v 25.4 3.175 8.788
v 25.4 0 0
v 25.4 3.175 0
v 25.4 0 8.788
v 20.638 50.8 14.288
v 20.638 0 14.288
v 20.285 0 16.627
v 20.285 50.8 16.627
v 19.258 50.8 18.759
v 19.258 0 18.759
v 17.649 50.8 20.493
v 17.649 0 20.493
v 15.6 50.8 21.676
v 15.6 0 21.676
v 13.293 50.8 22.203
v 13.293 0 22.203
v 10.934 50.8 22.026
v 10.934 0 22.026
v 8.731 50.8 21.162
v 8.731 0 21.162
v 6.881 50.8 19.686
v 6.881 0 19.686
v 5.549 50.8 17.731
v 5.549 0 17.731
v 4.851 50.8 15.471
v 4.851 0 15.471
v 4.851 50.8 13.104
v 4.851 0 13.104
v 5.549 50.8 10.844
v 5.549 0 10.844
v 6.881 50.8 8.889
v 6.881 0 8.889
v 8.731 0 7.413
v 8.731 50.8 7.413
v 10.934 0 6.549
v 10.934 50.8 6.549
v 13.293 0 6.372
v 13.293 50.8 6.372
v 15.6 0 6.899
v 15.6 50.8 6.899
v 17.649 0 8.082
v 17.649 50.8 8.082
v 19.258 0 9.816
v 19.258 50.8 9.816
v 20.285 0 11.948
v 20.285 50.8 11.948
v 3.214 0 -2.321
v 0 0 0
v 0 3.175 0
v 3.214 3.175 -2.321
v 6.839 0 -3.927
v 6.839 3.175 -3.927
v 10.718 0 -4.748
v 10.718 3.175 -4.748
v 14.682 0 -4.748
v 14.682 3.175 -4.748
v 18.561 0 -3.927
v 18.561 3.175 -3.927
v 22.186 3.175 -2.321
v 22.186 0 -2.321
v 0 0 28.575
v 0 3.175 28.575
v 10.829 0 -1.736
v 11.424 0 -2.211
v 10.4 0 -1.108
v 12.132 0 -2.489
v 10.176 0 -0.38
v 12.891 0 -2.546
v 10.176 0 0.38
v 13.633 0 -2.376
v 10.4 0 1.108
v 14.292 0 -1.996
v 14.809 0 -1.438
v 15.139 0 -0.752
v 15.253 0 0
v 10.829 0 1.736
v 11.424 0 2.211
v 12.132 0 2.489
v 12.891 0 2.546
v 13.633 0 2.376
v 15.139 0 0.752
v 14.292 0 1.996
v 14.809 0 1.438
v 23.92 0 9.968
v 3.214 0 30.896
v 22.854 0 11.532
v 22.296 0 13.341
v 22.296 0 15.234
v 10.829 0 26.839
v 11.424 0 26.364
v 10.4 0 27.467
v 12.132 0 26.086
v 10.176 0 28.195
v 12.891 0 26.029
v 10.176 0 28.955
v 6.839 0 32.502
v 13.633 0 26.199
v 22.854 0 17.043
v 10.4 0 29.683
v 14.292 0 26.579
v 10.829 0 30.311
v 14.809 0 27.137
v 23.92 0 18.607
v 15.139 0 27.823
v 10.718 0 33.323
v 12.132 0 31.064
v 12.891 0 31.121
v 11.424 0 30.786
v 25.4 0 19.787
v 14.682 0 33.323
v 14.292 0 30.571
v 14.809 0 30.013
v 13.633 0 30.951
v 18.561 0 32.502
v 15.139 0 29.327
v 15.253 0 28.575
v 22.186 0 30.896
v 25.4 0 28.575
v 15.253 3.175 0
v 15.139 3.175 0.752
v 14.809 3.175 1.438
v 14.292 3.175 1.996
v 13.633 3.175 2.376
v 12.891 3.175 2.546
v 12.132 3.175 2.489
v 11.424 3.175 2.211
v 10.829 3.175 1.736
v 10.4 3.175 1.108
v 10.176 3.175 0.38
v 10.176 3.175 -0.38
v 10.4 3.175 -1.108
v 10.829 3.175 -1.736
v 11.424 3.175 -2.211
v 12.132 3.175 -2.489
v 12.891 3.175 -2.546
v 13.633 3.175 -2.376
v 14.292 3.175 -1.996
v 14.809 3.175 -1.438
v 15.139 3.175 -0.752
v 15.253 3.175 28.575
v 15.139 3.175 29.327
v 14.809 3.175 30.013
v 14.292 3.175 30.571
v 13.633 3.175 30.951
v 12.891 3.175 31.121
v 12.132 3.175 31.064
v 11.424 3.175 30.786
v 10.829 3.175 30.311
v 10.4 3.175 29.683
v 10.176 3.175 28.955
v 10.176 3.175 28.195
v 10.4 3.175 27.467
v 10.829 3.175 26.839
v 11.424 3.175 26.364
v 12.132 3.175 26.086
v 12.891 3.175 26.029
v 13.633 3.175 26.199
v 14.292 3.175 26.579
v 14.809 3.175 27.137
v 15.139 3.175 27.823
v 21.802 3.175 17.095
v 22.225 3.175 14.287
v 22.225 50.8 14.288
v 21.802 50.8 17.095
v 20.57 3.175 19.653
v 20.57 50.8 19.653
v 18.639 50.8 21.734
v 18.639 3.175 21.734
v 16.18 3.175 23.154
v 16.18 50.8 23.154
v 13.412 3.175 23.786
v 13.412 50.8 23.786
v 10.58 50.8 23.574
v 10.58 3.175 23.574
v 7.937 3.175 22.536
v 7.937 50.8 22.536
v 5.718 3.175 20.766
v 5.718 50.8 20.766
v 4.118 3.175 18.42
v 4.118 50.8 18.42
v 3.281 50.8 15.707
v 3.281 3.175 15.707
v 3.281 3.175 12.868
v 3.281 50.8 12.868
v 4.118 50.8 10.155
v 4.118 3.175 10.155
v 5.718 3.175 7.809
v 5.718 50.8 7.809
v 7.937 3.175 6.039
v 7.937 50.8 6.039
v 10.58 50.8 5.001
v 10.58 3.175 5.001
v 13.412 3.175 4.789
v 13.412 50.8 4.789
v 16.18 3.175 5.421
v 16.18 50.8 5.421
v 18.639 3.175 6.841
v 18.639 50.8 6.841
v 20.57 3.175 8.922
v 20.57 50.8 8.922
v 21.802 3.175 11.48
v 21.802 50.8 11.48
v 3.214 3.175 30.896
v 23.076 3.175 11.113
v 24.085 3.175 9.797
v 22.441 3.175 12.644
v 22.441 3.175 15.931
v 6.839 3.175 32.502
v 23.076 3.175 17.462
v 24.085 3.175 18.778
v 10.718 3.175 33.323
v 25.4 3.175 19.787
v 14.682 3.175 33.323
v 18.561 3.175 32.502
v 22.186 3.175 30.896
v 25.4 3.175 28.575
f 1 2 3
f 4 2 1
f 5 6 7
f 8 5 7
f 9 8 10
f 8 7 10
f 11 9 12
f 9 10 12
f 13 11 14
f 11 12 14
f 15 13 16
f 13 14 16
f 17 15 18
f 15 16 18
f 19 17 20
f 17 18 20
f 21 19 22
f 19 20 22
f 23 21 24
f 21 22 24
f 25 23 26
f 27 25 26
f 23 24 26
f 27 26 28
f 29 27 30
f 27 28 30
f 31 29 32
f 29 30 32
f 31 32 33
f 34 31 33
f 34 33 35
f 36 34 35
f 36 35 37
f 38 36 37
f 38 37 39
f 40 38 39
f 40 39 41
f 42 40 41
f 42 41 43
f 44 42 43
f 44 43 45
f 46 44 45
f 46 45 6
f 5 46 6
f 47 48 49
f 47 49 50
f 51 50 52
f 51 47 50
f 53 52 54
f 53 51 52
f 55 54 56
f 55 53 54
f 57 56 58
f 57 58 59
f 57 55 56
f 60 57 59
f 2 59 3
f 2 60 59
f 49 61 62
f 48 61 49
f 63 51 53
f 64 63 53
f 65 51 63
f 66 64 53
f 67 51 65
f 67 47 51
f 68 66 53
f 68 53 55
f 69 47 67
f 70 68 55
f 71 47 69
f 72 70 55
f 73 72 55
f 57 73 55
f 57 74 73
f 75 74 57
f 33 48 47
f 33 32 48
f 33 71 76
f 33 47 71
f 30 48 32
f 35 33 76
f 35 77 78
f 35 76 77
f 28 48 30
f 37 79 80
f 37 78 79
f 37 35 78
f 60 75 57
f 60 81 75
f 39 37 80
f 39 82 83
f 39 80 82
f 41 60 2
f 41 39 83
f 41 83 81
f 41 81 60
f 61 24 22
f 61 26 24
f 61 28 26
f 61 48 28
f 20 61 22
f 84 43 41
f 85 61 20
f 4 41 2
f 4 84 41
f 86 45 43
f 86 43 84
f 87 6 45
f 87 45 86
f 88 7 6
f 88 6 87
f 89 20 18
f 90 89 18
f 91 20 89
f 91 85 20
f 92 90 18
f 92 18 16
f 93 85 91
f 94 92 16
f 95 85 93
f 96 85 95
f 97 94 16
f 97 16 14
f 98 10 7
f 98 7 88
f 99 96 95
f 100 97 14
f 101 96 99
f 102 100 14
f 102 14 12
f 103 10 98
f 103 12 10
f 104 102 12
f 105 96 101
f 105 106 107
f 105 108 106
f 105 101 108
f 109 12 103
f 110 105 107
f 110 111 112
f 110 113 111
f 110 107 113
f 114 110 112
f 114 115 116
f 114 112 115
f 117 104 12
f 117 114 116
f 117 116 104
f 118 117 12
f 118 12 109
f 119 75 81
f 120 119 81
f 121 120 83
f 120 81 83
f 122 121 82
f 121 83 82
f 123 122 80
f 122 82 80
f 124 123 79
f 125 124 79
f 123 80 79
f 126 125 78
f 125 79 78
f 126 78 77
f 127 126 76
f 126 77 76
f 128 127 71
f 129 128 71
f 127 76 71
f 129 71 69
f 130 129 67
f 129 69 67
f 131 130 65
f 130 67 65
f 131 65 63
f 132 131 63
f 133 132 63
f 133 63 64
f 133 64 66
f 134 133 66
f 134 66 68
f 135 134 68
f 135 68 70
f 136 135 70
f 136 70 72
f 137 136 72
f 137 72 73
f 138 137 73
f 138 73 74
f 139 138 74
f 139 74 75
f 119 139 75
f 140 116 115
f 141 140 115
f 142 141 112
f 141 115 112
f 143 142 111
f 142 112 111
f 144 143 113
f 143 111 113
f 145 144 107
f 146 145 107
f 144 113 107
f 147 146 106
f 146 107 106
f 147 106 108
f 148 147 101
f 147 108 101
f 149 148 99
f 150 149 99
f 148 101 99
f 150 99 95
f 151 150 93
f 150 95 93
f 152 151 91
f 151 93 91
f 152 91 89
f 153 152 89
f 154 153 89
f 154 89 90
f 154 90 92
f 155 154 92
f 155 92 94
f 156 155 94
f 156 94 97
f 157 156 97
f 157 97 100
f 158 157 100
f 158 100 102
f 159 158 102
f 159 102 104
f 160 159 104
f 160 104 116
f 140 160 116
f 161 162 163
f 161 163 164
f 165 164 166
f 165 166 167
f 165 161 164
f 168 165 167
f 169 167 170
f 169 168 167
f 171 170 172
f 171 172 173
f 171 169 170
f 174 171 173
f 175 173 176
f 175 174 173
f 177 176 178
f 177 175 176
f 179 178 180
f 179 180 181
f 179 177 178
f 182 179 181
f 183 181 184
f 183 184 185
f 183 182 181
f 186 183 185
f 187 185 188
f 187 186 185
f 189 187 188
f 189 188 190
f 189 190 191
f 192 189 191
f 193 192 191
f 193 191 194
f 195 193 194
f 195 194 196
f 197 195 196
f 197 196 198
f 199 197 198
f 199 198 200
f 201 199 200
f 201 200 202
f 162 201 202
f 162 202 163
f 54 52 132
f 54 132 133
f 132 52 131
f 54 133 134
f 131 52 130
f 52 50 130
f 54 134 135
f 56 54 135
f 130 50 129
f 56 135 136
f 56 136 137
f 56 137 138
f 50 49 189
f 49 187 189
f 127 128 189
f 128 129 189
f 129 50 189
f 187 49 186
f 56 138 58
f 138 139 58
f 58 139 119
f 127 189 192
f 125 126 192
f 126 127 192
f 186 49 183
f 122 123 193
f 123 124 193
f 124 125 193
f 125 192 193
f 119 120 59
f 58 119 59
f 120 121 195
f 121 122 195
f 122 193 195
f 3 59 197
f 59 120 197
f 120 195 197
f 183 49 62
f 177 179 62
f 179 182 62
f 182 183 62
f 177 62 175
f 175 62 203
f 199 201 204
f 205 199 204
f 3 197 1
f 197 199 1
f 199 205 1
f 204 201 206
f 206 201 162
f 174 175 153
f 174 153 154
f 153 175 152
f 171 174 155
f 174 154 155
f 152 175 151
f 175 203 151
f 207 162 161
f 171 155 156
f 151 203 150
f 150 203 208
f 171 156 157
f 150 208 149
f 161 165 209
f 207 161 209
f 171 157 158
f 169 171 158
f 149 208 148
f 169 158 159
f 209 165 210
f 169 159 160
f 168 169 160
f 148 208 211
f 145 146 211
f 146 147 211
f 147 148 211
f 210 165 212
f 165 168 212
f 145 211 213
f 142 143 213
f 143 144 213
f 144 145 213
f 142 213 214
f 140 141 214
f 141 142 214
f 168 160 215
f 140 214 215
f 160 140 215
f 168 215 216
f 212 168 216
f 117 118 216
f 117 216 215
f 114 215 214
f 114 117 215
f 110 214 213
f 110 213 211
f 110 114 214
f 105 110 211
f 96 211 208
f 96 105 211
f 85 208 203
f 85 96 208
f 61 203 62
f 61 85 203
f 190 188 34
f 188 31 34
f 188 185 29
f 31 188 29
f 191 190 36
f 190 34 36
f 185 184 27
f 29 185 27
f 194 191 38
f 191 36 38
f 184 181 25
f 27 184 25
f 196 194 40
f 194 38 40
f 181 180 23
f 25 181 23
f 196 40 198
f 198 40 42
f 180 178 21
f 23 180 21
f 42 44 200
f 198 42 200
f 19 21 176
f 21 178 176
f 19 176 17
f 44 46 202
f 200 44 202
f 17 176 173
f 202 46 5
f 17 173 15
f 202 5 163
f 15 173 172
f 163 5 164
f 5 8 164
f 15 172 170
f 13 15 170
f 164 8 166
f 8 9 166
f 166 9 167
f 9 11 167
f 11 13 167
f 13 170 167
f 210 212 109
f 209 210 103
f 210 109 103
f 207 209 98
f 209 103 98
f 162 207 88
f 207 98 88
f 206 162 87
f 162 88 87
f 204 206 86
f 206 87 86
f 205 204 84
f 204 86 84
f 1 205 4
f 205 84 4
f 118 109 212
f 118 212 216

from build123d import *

# Parameters (mm, degrees)
F1_DEPTH = 3.175
F2_R     = 2.5527
F2_R_2   = 7.9375
F3_DEPTH = 3.176
F4_R     = 9.525
F4_R_2   = 7.9375
F5_DEPTH = 50.8


with BuildPart() as f1:
    # F0 (on Front) → F1 (new body)
    with BuildSketch(Plane.XZ):
        with BuildLine():
            Line((0, 28.575), (0, 0))
            ThreePointArc((0, 0), (12.7, -4.850968), (25.4, 0))
            Line((25.4, 0), (25.4, 28.575))
            ThreePointArc((25.4, 28.575), (12.7, 33.425968), (0, 28.575))
        make_face()
    extrude(amount=-F1_DEPTH)

    # F2 (on face) → F3 (cut, through all)
    with BuildSketch(Plane.XZ):
        with Locations((12.7, 28.575)):
            Circle(F2_R)
        with Locations((12.7, 0)):
            Circle(F2_R)
        with Locations((12.7, 14.2875)):
            Circle(F2_R_2)
        with BuildLine():
            ThreePointArc((25.4, 19.786761), (22.225, 14.2875), (25.4, 8.788239))
            Line((25.4, 8.788239), (25.4, 19.786761))
        make_face()
    extrude(amount=-F3_DEPTH, mode=Mode.SUBTRACT)

    # F4 (on face) → F5 (join)
    with BuildSketch(Plane.XZ):
        with Locations((12.7, 14.2875)):
            Circle(F4_R)
        with Locations((12.7, 14.2875)):
            Circle(F4_R_2, mode=Mode.SUBTRACT)
    extrude(amount=-F5_DEPTH)


solid = f1.part
